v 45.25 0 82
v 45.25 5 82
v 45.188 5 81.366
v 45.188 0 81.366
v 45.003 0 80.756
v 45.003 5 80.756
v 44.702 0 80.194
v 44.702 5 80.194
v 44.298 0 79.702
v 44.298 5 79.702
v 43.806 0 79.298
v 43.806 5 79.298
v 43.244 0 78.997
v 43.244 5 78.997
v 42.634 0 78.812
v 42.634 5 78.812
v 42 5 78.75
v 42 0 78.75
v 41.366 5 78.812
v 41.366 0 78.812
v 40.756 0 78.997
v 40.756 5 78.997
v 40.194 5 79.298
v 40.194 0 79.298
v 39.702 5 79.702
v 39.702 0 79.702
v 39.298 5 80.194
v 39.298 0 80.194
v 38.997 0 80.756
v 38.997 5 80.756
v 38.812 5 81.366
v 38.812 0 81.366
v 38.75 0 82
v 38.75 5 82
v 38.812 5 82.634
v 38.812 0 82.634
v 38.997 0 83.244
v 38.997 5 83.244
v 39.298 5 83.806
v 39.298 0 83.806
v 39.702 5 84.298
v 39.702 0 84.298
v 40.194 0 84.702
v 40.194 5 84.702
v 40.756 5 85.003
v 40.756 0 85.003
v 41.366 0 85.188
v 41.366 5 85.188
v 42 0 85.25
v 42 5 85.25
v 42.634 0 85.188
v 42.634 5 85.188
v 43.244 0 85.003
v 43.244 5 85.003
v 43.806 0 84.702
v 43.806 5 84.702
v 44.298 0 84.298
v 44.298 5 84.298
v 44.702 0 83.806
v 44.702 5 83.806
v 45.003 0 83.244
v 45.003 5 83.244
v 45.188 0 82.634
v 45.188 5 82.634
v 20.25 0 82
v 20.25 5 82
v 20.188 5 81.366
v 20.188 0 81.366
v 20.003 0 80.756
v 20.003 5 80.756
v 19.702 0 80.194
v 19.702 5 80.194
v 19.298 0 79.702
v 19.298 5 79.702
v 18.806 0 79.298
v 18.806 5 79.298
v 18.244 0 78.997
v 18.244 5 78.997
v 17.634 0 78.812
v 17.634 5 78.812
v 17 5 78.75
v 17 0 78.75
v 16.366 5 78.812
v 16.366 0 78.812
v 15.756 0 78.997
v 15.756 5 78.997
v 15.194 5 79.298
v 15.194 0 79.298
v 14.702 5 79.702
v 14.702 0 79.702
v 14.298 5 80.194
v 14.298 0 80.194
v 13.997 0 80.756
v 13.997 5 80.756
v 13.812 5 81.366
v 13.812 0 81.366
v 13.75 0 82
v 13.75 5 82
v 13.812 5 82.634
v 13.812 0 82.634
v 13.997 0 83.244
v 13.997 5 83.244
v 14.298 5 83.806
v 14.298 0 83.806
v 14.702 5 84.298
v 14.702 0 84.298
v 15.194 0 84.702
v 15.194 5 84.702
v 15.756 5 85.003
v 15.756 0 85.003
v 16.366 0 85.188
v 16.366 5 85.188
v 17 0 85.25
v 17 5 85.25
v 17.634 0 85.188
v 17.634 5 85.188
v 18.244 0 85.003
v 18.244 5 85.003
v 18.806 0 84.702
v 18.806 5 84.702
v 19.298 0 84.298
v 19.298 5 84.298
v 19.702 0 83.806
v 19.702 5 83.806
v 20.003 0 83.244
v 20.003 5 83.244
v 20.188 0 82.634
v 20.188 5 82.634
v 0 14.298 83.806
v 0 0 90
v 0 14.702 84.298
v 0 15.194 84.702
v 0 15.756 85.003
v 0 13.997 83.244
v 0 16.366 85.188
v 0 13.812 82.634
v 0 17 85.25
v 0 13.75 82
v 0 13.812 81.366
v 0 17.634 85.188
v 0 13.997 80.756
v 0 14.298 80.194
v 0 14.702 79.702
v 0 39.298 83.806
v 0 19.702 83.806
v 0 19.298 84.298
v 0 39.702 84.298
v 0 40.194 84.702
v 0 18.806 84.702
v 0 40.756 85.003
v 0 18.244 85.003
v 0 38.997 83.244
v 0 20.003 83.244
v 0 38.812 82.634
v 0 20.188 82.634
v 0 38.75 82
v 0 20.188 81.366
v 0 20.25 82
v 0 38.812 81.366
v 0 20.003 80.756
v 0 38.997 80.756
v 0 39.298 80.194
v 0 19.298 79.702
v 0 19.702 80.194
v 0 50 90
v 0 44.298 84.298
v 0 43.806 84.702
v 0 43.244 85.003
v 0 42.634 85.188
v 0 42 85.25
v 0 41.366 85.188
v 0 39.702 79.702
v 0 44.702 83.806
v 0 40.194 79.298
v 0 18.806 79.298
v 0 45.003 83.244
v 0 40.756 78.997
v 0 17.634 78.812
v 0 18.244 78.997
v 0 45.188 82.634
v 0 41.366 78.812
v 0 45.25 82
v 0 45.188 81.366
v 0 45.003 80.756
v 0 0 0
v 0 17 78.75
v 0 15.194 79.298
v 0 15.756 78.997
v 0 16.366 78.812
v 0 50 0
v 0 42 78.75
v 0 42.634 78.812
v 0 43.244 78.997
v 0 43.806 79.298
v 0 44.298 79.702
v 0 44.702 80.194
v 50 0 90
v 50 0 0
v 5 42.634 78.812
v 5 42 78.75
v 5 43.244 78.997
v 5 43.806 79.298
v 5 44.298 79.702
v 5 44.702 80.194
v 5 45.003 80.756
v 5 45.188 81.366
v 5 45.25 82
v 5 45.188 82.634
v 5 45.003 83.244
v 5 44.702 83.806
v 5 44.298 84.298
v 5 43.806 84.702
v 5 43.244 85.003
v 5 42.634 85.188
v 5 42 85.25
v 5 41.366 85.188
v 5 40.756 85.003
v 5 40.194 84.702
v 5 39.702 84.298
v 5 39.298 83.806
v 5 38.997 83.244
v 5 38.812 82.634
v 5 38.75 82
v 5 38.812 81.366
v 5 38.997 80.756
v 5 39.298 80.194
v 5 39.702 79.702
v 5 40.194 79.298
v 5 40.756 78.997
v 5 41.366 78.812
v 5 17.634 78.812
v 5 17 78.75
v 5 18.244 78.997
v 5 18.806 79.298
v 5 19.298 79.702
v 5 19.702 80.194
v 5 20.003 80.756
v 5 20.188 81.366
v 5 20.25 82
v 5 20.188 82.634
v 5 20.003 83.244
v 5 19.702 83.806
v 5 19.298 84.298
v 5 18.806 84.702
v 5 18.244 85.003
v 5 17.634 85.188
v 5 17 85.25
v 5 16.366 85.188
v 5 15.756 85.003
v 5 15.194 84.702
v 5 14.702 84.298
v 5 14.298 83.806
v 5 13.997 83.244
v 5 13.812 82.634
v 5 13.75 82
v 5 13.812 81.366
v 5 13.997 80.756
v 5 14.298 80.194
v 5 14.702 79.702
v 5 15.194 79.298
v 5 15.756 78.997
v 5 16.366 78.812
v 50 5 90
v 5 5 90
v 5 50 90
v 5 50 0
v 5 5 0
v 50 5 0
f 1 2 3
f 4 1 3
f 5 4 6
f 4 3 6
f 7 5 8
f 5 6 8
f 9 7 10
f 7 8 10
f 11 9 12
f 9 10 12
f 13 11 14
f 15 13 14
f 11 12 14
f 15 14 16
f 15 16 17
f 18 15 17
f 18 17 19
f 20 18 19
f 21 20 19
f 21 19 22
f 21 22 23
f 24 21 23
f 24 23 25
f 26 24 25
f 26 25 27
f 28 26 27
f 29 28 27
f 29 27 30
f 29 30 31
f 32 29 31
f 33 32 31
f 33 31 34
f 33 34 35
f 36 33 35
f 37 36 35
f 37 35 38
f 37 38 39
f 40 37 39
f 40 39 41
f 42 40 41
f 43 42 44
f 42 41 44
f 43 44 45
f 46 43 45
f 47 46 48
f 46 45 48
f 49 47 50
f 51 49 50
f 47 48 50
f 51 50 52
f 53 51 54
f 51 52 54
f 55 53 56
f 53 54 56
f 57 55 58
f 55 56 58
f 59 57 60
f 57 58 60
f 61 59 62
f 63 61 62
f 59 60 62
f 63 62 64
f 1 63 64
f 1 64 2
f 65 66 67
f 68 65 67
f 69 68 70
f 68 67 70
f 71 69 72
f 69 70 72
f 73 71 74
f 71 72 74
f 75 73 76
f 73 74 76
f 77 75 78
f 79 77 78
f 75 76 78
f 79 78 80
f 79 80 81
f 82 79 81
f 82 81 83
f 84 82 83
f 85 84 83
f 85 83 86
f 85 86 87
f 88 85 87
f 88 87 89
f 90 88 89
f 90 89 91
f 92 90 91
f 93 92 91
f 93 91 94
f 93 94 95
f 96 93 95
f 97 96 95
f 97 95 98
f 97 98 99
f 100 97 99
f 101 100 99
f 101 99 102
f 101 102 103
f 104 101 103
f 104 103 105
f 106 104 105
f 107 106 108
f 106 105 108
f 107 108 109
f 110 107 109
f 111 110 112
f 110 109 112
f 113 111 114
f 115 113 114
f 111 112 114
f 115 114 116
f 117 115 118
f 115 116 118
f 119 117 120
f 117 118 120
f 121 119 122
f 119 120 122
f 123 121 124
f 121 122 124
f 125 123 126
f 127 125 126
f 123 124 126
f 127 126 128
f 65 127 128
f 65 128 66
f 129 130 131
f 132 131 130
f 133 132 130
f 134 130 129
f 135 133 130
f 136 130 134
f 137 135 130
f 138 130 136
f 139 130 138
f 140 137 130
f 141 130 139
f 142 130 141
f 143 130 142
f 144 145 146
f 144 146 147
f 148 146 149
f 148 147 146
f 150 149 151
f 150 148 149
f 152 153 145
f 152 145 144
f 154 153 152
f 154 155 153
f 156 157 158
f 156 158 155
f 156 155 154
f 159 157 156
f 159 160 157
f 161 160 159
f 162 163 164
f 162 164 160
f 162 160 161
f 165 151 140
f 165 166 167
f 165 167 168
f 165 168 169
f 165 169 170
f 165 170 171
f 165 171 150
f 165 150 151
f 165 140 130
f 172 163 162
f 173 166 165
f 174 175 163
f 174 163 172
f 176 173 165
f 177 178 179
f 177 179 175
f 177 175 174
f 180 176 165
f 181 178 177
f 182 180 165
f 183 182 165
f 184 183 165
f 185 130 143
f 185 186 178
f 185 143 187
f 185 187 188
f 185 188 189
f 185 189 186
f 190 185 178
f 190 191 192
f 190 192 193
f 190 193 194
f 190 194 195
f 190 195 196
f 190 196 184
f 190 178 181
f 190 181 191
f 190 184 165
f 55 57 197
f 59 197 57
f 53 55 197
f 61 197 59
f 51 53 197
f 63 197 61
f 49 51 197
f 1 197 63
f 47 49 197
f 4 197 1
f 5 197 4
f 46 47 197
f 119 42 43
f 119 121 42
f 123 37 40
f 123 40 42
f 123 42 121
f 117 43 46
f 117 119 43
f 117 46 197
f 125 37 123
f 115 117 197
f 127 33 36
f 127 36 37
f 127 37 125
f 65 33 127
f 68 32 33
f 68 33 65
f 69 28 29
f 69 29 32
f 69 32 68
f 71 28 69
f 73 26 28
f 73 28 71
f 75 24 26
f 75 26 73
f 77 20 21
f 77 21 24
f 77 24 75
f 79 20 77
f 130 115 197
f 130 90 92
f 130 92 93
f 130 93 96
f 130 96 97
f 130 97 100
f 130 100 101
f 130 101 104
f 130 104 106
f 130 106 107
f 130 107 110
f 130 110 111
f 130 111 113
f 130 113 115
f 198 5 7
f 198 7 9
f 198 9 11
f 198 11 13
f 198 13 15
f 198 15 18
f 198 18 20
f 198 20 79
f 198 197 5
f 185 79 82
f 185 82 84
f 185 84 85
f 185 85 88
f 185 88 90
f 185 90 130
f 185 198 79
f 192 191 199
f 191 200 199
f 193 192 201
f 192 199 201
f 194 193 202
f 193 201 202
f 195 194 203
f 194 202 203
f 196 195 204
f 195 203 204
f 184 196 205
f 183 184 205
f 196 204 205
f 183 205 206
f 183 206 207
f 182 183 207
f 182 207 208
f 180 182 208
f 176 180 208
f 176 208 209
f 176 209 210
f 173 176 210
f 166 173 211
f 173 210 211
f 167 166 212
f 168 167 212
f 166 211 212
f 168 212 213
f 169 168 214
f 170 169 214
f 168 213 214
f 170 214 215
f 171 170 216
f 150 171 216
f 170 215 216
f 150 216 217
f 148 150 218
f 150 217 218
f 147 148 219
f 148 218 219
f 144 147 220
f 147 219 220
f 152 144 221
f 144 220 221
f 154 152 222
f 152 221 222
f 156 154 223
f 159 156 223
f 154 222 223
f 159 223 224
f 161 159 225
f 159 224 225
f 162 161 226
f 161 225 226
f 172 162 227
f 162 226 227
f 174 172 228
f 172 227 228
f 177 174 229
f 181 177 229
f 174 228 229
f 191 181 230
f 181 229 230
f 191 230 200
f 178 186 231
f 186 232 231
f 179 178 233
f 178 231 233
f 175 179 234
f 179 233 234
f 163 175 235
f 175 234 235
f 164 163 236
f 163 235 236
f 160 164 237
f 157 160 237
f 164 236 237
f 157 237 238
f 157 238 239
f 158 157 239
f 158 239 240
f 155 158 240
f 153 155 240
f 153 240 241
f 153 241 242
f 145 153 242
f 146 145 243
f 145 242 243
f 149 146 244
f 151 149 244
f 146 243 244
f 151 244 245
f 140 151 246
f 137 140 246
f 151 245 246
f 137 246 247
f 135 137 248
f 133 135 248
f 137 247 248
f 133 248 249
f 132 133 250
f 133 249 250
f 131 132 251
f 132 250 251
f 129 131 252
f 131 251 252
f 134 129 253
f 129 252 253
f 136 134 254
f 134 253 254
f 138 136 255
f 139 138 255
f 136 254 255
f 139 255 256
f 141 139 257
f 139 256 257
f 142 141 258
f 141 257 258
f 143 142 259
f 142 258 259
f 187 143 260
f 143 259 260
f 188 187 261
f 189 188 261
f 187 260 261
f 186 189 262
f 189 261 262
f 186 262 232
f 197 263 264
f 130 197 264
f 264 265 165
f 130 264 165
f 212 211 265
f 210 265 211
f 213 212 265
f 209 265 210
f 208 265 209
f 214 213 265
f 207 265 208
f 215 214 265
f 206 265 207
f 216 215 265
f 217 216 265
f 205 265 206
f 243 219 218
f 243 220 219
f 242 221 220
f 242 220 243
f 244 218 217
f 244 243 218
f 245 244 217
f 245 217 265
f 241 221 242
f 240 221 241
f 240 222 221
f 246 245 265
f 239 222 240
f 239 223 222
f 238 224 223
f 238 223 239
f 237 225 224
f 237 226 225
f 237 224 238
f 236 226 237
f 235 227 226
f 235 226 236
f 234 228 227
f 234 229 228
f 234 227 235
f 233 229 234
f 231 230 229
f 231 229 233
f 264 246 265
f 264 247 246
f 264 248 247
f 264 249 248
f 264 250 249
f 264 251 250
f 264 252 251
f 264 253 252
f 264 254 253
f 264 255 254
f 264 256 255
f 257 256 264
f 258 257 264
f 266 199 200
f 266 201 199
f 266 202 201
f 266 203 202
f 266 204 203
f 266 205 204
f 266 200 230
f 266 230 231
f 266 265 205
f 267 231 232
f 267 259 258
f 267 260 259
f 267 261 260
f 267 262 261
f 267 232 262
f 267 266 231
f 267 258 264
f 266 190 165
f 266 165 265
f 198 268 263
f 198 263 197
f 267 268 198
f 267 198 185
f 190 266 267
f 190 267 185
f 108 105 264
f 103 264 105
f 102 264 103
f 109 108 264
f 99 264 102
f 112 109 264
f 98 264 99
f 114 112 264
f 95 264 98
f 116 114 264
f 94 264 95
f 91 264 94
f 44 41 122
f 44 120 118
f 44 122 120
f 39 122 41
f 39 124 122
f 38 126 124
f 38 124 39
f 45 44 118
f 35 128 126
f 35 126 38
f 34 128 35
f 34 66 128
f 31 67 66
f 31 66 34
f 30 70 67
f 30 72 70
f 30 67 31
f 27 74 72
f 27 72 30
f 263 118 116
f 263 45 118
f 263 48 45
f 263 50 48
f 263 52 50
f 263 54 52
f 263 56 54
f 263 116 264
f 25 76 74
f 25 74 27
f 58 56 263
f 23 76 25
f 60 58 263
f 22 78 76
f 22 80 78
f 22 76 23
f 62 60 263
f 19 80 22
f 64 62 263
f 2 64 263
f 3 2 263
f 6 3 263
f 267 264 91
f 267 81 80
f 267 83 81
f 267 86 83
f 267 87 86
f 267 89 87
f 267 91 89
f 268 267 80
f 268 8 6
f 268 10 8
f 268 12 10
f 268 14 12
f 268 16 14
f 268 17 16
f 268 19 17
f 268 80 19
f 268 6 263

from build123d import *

# Parameters (mm, degrees)
ESTRUSIONE_ESTRUSIONE1_DEPTH = 90
FORO_6_5_6_5_1_D             = 6.5
FORO_6_5_6_5_2_D             = 6.5
FORO_6_5_6_5_2_DEPTH         = 5
FORO_6_5_6_5_2_TIP           = 1.952797012


with BuildPart() as part:
    # Schizzo1 → Estrusione-Estrusione1 (new body)
    with BuildSketch(Plane.XY):
        Polygon((0, 0), (0, 50), (5, 50), (5, 5), (50, 5), (50, 0), align=None)
    extrude(amount=ESTRUSIONE_ESTRUSIONE1_DEPTH)

    # Foro Ø6.5 (6.5)-1 (through all)
    with Locations(Plane(origin=(0, 0, 0), x_dir=(-1, 0, 0), z_dir=(0, -1, 0))):
        with Locations((-17, -82), (-42, -82)):
            Hole(FORO_6_5_6_5_1_D / 2)

    # Foro Ø6.5 (6.5)-2
    with Locations(Plane.ZY):
        with Locations((82, 42), (82, 17)):
            Hole(FORO_6_5_6_5_2_D / 2, depth=FORO_6_5_6_5_2_DEPTH)
            with Locations((0, 0, -(FORO_6_5_6_5_2_DEPTH + FORO_6_5_6_5_2_TIP / 2))):  # 118° drill point
                Cone(0, FORO_6_5_6_5_2_D / 2, FORO_6_5_6_5_2_TIP, mode=Mode.SUBTRACT)


solid = part.part
